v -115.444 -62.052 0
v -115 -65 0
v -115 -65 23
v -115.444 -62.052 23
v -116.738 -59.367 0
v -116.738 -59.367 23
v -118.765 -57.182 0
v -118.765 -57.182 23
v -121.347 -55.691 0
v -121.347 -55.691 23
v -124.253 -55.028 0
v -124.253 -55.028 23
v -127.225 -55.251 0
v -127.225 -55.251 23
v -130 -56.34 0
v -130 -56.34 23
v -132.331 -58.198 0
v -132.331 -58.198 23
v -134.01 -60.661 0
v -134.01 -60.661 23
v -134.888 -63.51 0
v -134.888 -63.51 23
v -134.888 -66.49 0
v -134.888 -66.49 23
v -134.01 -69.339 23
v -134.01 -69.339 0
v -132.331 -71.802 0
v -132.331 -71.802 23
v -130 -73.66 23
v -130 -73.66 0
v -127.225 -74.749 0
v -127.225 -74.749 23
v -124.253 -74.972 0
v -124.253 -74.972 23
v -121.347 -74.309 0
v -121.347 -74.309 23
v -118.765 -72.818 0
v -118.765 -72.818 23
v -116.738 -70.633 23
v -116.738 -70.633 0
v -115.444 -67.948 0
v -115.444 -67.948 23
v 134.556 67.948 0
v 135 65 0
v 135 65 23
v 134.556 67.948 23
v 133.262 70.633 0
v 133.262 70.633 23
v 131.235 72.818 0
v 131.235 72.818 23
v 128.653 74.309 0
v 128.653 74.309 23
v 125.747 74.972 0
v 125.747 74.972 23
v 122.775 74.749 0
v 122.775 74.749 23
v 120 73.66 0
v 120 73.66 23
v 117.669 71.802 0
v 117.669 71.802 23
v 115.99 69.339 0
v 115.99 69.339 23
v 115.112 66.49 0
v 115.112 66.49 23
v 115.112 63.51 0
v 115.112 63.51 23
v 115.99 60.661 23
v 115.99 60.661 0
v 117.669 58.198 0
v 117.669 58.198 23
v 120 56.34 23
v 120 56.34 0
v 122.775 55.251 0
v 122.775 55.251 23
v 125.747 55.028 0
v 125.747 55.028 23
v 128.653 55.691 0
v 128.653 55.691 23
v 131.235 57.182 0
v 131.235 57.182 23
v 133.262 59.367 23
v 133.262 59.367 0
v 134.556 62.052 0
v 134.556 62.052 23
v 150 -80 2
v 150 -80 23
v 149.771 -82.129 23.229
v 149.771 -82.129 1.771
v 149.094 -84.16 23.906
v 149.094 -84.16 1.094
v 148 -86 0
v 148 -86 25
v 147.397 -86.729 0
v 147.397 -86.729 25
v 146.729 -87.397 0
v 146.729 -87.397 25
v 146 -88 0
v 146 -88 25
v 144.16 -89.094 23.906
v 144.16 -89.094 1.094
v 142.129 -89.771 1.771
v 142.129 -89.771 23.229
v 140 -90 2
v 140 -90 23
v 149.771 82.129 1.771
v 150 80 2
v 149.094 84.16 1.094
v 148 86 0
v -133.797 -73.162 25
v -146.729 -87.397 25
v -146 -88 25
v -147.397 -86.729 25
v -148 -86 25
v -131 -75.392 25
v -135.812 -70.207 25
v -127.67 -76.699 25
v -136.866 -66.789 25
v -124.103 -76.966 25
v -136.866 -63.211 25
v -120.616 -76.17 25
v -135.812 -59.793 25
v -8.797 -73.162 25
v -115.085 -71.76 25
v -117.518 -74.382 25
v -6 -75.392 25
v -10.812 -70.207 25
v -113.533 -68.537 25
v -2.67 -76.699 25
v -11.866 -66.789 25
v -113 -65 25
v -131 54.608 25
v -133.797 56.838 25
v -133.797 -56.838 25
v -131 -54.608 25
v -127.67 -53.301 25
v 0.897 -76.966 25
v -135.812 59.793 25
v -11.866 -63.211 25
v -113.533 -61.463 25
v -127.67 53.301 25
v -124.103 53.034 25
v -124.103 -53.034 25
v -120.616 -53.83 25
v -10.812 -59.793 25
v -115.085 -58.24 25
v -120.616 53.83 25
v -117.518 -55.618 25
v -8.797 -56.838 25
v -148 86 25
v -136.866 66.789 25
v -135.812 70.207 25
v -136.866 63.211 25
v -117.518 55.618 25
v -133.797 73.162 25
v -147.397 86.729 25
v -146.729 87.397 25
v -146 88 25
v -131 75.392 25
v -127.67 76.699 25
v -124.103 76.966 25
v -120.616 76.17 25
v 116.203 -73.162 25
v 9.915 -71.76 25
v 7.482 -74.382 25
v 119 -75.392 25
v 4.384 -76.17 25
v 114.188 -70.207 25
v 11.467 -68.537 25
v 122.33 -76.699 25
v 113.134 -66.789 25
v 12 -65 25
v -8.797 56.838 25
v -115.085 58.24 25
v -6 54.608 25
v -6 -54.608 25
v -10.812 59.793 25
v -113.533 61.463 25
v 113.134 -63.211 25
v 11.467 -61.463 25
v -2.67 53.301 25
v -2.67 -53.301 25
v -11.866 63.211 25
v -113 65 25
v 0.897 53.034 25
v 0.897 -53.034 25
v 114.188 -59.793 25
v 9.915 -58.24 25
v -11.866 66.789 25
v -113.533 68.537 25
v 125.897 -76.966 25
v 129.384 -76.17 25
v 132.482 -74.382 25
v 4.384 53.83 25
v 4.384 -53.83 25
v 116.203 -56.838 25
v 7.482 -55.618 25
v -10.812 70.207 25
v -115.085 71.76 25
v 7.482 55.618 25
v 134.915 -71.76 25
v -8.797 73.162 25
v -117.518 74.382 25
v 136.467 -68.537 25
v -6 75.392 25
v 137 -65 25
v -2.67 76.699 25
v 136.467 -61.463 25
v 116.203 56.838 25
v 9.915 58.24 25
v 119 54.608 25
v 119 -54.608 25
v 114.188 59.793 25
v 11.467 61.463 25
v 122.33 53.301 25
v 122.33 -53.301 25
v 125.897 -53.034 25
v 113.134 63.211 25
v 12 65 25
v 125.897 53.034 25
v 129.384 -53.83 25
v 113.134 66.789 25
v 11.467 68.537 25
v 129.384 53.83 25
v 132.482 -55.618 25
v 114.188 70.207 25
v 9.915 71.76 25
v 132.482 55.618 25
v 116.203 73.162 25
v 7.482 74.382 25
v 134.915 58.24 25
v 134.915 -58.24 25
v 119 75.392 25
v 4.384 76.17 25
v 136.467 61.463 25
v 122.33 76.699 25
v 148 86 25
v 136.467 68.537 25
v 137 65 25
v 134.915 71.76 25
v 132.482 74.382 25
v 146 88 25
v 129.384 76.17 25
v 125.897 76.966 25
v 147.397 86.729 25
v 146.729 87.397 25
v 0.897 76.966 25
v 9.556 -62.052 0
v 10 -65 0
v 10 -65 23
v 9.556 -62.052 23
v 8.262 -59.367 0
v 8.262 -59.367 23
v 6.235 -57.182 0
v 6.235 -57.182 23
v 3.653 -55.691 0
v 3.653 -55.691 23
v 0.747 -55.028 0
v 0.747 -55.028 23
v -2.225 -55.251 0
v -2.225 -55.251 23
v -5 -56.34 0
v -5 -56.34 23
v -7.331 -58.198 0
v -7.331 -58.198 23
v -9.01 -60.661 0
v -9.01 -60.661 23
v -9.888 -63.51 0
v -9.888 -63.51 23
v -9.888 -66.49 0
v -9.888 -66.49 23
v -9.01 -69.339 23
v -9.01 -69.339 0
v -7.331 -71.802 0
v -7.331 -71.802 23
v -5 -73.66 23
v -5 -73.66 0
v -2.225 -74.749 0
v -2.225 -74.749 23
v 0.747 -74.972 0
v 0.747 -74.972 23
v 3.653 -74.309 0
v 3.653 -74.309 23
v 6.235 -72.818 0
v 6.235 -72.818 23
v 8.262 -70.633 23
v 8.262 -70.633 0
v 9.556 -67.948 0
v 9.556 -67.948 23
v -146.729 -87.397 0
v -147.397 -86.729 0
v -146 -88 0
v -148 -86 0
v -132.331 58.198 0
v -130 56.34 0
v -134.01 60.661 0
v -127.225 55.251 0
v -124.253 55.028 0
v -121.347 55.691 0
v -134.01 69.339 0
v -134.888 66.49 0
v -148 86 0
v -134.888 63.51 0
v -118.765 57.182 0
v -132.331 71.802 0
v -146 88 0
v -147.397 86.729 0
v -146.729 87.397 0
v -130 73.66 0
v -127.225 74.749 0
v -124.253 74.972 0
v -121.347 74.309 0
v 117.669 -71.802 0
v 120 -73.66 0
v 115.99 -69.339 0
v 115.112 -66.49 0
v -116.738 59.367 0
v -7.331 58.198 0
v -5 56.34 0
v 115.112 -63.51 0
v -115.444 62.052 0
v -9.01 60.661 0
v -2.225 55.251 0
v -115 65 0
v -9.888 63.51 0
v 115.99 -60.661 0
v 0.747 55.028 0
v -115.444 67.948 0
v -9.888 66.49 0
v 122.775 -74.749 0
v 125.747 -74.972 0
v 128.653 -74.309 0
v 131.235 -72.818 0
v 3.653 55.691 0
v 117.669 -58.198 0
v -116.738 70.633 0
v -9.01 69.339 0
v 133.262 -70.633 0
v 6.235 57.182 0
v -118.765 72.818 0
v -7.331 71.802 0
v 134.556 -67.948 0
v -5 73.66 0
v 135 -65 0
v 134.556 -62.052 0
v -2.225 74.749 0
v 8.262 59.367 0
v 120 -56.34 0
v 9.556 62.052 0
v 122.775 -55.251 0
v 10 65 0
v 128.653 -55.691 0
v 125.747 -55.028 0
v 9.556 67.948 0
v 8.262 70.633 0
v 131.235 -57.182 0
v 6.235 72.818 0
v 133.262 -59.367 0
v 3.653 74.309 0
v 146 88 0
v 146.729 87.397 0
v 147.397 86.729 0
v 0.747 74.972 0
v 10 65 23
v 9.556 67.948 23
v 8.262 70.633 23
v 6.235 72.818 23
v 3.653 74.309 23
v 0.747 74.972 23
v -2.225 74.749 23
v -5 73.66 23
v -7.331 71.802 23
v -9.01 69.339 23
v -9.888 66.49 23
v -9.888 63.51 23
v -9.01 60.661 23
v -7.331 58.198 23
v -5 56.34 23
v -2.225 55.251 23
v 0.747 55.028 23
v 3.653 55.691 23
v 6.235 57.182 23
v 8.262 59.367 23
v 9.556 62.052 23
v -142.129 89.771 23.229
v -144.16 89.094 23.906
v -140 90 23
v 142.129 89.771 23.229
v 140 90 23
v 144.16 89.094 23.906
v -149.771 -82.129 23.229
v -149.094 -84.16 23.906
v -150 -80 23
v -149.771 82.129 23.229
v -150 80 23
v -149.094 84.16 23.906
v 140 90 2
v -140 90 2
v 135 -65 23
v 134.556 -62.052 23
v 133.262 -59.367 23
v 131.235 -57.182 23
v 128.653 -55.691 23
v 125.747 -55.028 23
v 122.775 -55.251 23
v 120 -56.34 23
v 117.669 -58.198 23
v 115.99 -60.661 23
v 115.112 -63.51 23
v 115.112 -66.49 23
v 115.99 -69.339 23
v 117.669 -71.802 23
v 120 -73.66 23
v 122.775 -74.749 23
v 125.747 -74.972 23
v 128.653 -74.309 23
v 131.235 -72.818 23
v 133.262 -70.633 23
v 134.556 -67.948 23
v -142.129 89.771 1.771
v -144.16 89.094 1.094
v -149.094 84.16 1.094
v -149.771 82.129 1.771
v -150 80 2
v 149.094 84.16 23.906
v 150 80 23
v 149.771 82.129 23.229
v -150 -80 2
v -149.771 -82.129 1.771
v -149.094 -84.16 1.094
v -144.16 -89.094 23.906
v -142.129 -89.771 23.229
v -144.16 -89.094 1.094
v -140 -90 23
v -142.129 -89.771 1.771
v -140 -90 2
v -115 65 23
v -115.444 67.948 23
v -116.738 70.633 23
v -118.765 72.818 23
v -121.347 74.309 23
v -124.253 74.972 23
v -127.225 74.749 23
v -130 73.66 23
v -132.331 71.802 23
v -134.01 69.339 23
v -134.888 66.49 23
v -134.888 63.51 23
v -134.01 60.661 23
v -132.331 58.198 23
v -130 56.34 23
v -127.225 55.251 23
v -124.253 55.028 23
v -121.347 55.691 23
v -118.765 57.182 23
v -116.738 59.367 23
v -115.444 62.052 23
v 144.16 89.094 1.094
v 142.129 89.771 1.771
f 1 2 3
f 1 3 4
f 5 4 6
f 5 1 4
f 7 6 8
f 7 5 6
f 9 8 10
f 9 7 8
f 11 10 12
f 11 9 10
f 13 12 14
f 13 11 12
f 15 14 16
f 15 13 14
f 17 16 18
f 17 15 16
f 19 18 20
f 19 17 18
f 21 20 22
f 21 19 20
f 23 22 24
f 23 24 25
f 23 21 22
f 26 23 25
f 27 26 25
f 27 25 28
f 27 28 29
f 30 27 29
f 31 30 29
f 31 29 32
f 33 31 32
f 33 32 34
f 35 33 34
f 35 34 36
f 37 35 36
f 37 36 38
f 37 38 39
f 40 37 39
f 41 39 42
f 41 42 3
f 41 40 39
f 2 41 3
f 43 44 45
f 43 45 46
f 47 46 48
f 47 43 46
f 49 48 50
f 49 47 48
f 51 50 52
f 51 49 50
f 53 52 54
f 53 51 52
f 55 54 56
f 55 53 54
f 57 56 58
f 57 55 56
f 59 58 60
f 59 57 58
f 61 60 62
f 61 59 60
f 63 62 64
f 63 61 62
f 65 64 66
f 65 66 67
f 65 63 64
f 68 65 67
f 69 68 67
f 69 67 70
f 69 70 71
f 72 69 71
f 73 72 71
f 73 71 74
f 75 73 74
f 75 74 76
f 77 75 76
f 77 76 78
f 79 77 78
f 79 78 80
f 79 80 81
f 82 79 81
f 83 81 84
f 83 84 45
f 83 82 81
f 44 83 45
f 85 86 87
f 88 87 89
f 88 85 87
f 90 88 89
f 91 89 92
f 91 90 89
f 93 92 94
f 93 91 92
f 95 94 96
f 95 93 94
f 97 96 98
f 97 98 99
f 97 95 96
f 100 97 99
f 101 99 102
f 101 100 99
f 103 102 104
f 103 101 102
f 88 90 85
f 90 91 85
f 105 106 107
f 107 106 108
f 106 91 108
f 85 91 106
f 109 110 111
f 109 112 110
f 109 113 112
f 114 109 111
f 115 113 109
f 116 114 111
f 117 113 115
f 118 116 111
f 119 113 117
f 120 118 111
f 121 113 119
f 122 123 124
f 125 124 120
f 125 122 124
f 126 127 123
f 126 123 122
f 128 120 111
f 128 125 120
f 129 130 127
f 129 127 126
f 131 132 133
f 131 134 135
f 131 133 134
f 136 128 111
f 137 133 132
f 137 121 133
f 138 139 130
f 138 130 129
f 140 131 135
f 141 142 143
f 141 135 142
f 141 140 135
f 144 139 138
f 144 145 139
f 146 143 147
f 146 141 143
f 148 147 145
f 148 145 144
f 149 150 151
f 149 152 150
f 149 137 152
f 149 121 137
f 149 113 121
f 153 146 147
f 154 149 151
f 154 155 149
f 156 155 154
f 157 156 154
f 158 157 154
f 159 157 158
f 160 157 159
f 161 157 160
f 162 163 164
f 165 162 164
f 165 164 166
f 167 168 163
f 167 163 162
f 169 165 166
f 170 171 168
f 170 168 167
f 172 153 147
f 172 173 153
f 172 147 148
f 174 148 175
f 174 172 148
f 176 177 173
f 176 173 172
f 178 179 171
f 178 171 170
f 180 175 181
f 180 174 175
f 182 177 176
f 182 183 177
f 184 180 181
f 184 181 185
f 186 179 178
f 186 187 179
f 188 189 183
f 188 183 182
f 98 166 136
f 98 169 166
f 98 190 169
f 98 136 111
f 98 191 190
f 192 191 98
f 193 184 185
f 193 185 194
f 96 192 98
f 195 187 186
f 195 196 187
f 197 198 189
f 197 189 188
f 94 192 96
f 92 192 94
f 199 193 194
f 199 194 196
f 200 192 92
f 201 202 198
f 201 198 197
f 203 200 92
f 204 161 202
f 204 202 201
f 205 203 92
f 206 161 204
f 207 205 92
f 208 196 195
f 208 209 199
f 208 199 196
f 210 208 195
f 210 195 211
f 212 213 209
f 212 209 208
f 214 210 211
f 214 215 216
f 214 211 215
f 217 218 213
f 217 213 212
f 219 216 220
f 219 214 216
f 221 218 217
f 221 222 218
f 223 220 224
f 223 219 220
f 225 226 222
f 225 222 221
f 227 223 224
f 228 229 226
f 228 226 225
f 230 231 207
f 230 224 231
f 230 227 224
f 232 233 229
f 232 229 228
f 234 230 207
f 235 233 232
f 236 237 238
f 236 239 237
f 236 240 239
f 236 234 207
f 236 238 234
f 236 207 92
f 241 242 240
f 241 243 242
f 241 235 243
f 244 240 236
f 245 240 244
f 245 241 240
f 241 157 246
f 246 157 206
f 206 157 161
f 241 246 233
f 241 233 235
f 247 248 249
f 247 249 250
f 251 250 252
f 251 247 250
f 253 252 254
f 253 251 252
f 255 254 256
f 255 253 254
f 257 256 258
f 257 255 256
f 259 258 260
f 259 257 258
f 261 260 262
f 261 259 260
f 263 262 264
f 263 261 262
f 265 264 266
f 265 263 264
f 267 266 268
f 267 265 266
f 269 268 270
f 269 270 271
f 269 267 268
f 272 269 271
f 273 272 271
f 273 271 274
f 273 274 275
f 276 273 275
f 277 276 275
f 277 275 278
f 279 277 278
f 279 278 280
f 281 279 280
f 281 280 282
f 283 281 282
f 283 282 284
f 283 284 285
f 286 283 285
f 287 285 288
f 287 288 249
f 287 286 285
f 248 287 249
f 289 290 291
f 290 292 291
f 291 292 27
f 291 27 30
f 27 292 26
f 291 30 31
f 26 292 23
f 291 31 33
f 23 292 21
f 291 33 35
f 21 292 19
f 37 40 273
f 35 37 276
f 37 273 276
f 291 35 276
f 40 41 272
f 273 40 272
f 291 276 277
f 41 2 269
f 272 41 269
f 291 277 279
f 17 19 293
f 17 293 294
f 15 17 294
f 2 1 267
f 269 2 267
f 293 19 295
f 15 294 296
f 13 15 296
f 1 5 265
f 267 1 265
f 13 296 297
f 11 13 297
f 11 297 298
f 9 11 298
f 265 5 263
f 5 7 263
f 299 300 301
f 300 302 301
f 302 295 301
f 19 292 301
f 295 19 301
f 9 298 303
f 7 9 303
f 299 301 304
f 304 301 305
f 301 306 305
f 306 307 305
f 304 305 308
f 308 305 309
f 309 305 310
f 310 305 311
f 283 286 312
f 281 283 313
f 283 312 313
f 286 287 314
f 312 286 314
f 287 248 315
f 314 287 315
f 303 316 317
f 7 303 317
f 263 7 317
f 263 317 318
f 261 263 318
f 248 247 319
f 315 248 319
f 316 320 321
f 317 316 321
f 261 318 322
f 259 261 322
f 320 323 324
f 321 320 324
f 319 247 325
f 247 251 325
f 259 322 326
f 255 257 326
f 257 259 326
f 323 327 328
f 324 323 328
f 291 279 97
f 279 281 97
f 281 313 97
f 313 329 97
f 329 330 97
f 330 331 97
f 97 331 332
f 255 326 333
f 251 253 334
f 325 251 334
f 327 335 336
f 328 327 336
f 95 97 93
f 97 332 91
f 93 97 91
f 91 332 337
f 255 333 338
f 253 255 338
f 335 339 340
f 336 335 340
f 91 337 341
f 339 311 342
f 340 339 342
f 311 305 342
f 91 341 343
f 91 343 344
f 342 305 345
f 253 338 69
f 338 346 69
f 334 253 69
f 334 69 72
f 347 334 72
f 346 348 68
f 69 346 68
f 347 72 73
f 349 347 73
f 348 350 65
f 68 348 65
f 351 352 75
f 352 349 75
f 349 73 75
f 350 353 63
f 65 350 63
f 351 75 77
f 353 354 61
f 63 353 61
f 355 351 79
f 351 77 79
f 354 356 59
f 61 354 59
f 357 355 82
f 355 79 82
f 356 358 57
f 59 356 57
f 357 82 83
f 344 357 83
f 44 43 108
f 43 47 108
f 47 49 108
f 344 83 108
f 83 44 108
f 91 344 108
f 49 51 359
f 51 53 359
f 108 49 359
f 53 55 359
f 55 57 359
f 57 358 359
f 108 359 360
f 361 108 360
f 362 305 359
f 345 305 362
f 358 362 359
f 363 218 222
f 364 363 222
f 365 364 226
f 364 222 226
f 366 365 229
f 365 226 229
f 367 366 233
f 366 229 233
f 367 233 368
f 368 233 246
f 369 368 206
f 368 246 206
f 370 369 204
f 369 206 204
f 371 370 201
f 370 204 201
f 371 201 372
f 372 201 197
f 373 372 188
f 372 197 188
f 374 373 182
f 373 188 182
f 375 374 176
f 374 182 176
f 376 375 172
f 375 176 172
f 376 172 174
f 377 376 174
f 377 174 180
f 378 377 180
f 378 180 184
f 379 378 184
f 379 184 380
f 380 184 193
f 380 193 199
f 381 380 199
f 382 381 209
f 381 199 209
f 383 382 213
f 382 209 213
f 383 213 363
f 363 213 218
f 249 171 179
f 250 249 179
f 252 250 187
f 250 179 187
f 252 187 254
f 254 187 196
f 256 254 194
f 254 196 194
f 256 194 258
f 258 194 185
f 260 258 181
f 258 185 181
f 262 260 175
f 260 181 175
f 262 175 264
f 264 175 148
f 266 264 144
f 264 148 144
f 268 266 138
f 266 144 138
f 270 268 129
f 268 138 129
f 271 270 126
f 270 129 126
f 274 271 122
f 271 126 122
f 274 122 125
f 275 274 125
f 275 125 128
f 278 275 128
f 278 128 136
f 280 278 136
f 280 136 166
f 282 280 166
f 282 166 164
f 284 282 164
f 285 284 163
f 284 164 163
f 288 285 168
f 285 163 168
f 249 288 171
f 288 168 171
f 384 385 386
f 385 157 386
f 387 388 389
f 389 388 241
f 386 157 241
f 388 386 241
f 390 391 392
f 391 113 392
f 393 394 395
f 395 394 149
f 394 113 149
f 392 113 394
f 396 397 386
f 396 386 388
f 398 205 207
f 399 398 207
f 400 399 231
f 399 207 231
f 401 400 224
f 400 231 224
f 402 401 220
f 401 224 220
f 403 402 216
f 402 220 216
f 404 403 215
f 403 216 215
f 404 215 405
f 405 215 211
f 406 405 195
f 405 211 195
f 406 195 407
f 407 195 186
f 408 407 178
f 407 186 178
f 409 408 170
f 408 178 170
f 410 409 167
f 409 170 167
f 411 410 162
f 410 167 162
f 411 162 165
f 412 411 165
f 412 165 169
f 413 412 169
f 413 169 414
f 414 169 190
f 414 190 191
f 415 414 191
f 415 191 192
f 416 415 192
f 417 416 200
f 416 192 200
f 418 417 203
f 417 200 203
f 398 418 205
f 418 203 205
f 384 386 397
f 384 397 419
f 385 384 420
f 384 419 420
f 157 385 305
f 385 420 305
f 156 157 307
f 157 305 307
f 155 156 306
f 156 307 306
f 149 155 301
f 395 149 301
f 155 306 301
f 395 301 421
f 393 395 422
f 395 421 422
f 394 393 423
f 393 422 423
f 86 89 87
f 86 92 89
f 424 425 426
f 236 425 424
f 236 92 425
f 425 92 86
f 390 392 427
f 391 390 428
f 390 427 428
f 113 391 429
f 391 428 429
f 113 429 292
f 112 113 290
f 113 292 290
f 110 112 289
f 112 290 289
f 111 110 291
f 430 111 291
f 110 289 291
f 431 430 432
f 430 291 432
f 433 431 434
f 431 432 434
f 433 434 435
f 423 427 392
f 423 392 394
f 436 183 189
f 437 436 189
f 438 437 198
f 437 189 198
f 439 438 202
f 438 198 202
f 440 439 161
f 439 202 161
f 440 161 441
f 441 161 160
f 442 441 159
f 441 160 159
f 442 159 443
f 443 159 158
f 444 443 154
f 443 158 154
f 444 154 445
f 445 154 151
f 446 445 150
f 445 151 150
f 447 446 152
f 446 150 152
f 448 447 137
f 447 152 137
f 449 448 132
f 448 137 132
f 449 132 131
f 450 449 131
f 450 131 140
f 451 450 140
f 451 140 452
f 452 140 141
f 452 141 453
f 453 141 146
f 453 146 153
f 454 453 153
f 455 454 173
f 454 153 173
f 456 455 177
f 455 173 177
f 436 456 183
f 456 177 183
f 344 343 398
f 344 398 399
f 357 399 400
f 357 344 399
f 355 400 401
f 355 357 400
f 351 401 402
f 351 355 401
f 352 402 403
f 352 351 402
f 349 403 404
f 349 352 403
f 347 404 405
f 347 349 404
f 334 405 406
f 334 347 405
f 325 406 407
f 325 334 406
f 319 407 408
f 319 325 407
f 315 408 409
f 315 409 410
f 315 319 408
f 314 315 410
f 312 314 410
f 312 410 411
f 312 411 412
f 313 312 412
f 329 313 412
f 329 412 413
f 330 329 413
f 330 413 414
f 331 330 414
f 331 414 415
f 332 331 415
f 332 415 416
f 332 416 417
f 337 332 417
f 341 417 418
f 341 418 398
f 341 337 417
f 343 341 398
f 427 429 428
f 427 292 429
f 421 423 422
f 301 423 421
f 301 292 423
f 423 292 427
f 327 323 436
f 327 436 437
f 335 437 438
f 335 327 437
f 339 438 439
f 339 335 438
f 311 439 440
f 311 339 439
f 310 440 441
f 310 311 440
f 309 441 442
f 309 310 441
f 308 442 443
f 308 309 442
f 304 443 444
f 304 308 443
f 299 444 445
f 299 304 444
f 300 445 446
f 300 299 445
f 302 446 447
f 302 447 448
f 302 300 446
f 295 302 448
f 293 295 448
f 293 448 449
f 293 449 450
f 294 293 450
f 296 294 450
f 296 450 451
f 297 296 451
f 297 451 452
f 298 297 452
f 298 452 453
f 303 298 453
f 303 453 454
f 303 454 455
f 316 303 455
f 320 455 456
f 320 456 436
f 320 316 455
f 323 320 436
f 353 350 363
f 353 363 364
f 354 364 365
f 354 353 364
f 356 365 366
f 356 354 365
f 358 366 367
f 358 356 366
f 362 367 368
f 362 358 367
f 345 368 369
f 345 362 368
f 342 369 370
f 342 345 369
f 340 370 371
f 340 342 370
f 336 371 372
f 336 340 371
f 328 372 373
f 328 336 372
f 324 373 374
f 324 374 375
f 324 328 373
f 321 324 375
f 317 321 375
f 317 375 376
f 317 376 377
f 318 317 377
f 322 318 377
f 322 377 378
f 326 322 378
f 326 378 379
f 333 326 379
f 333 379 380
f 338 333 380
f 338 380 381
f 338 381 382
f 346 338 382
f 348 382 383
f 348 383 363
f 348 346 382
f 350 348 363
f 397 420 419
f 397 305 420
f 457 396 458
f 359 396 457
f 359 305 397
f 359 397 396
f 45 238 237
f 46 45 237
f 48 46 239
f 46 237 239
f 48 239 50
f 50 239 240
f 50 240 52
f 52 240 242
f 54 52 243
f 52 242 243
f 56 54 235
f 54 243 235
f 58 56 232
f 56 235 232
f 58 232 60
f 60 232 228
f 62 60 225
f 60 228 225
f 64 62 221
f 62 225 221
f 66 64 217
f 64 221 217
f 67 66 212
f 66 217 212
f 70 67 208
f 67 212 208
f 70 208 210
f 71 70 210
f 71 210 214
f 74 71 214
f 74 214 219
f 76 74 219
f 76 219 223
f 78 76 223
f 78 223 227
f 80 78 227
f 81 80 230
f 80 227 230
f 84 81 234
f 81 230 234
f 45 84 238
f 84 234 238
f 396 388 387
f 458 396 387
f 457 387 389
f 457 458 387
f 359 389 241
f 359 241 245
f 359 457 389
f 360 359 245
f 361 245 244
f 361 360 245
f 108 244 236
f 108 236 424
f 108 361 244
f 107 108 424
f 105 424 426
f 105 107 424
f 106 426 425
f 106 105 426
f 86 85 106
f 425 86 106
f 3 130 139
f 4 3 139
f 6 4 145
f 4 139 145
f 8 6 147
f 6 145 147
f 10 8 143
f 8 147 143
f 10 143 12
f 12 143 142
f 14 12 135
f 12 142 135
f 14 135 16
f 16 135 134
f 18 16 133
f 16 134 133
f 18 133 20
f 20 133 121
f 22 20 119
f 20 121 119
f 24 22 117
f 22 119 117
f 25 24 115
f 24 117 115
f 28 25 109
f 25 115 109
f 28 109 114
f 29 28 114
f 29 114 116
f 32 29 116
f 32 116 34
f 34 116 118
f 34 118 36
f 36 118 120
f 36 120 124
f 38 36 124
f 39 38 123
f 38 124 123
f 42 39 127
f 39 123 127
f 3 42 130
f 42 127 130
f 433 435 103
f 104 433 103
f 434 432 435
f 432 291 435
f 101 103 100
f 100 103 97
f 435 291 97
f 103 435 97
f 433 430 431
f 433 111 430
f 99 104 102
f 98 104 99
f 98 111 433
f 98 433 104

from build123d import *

# Parameters (mm, degrees)
F0_W        = 300
F0_H        = 180
F0_R        = 10
F1_DEPTH    = 25
F2_SIZE2    = 2
F2_SIZE     = 2
F3_SIZE2    = 2
F3_SIZE     = 2
F4_T1_DEPTH = 71


# Not quite as in the source:
# - a fillet or chamfer that OpenCascade refuses, or shapes differently, is made with other operations: its cross-section is extruded or revolved along the edge and cut away or added


with BuildPart() as f1:
    # F0 (on Top) → F1 (new body)
    with BuildSketch(Plane.XY):
        Rectangle(F0_W, F0_H)
        with Locations((-125, -65)):
            Circle(F0_R, mode=Mode.SUBTRACT)
        with Locations((0, -65)):
            Circle(F0_R, mode=Mode.SUBTRACT)
        with Locations((125, -65)):
            Circle(F0_R, mode=Mode.SUBTRACT)
        with Locations((-125, 65)):
            Circle(F0_R, mode=Mode.SUBTRACT)
        with Locations((0, 65)):
            Circle(F0_R, mode=Mode.SUBTRACT)
        with Locations((125, 65)):
            Circle(F0_R, mode=Mode.SUBTRACT)
    extrude(amount=F1_DEPTH)

    # F2
    f2_edges = [f1.edges().sort_by_distance(p)[0] for p in [
        (-135, -65, 25),
        (-135, 65, 25),
        (-10, -65, 25),
        (-10, 65, 25),
        (115, 65, 25),
        (115, -65, 25),
        (-150, 0, 25),
        (-150, 0, 0),
        (150, 0, 25),
        (150, 0, 0),
    ]]
    chamfer(f2_edges, length=F2_SIZE, length2=F2_SIZE2)

    # F3
    f3_edges = [f1.edges().sort_by_distance(p)[0] for p in [
        (0, -90, 25),
        (0, -90, 0),
        (0, 90, 25),
        (0, 90, 0),
    ]]
    chamfer(f3_edges, length=F3_SIZE, length2=F3_SIZE2)

    # F4: fillet of radius 10 on 4 edges, made by hand

    # F4_s2 → F4_t1 (cut)
    with BuildSketch(Plane.XY.offset(-23)):
        with BuildLine():
            ThreePointArc((150, -80), (147.0710678119, -87.0710678119), (140, -90))
            Line((140, -90), (150, -90))
            Line((150, -90), (150, -80))
        make_face()
        with BuildLine():
            ThreePointArc((-150, -80), (-147.0710678119, -87.0710678119), (-140, -90))
            Line((-140, -90), (-150, -90))
            Line((-150, -90), (-150, -80))
        make_face()
        with BuildLine():
            ThreePointArc((-140, 90), (-147.0710678119, 87.0710678119), (-150, 80))
            Line((-150, 80), (-150, 90))
            Line((-150, 90), (-140, 90))
        make_face()
        with BuildLine():
            ThreePointArc((140, 90), (147.0710678119, 87.0710678119), (150, 80))
            Line((150, 80), (150, 90))
            Line((150, 90), (140, 90))
        make_face()
    extrude(amount=F4_T1_DEPTH, mode=Mode.SUBTRACT)


solid = f1.part
